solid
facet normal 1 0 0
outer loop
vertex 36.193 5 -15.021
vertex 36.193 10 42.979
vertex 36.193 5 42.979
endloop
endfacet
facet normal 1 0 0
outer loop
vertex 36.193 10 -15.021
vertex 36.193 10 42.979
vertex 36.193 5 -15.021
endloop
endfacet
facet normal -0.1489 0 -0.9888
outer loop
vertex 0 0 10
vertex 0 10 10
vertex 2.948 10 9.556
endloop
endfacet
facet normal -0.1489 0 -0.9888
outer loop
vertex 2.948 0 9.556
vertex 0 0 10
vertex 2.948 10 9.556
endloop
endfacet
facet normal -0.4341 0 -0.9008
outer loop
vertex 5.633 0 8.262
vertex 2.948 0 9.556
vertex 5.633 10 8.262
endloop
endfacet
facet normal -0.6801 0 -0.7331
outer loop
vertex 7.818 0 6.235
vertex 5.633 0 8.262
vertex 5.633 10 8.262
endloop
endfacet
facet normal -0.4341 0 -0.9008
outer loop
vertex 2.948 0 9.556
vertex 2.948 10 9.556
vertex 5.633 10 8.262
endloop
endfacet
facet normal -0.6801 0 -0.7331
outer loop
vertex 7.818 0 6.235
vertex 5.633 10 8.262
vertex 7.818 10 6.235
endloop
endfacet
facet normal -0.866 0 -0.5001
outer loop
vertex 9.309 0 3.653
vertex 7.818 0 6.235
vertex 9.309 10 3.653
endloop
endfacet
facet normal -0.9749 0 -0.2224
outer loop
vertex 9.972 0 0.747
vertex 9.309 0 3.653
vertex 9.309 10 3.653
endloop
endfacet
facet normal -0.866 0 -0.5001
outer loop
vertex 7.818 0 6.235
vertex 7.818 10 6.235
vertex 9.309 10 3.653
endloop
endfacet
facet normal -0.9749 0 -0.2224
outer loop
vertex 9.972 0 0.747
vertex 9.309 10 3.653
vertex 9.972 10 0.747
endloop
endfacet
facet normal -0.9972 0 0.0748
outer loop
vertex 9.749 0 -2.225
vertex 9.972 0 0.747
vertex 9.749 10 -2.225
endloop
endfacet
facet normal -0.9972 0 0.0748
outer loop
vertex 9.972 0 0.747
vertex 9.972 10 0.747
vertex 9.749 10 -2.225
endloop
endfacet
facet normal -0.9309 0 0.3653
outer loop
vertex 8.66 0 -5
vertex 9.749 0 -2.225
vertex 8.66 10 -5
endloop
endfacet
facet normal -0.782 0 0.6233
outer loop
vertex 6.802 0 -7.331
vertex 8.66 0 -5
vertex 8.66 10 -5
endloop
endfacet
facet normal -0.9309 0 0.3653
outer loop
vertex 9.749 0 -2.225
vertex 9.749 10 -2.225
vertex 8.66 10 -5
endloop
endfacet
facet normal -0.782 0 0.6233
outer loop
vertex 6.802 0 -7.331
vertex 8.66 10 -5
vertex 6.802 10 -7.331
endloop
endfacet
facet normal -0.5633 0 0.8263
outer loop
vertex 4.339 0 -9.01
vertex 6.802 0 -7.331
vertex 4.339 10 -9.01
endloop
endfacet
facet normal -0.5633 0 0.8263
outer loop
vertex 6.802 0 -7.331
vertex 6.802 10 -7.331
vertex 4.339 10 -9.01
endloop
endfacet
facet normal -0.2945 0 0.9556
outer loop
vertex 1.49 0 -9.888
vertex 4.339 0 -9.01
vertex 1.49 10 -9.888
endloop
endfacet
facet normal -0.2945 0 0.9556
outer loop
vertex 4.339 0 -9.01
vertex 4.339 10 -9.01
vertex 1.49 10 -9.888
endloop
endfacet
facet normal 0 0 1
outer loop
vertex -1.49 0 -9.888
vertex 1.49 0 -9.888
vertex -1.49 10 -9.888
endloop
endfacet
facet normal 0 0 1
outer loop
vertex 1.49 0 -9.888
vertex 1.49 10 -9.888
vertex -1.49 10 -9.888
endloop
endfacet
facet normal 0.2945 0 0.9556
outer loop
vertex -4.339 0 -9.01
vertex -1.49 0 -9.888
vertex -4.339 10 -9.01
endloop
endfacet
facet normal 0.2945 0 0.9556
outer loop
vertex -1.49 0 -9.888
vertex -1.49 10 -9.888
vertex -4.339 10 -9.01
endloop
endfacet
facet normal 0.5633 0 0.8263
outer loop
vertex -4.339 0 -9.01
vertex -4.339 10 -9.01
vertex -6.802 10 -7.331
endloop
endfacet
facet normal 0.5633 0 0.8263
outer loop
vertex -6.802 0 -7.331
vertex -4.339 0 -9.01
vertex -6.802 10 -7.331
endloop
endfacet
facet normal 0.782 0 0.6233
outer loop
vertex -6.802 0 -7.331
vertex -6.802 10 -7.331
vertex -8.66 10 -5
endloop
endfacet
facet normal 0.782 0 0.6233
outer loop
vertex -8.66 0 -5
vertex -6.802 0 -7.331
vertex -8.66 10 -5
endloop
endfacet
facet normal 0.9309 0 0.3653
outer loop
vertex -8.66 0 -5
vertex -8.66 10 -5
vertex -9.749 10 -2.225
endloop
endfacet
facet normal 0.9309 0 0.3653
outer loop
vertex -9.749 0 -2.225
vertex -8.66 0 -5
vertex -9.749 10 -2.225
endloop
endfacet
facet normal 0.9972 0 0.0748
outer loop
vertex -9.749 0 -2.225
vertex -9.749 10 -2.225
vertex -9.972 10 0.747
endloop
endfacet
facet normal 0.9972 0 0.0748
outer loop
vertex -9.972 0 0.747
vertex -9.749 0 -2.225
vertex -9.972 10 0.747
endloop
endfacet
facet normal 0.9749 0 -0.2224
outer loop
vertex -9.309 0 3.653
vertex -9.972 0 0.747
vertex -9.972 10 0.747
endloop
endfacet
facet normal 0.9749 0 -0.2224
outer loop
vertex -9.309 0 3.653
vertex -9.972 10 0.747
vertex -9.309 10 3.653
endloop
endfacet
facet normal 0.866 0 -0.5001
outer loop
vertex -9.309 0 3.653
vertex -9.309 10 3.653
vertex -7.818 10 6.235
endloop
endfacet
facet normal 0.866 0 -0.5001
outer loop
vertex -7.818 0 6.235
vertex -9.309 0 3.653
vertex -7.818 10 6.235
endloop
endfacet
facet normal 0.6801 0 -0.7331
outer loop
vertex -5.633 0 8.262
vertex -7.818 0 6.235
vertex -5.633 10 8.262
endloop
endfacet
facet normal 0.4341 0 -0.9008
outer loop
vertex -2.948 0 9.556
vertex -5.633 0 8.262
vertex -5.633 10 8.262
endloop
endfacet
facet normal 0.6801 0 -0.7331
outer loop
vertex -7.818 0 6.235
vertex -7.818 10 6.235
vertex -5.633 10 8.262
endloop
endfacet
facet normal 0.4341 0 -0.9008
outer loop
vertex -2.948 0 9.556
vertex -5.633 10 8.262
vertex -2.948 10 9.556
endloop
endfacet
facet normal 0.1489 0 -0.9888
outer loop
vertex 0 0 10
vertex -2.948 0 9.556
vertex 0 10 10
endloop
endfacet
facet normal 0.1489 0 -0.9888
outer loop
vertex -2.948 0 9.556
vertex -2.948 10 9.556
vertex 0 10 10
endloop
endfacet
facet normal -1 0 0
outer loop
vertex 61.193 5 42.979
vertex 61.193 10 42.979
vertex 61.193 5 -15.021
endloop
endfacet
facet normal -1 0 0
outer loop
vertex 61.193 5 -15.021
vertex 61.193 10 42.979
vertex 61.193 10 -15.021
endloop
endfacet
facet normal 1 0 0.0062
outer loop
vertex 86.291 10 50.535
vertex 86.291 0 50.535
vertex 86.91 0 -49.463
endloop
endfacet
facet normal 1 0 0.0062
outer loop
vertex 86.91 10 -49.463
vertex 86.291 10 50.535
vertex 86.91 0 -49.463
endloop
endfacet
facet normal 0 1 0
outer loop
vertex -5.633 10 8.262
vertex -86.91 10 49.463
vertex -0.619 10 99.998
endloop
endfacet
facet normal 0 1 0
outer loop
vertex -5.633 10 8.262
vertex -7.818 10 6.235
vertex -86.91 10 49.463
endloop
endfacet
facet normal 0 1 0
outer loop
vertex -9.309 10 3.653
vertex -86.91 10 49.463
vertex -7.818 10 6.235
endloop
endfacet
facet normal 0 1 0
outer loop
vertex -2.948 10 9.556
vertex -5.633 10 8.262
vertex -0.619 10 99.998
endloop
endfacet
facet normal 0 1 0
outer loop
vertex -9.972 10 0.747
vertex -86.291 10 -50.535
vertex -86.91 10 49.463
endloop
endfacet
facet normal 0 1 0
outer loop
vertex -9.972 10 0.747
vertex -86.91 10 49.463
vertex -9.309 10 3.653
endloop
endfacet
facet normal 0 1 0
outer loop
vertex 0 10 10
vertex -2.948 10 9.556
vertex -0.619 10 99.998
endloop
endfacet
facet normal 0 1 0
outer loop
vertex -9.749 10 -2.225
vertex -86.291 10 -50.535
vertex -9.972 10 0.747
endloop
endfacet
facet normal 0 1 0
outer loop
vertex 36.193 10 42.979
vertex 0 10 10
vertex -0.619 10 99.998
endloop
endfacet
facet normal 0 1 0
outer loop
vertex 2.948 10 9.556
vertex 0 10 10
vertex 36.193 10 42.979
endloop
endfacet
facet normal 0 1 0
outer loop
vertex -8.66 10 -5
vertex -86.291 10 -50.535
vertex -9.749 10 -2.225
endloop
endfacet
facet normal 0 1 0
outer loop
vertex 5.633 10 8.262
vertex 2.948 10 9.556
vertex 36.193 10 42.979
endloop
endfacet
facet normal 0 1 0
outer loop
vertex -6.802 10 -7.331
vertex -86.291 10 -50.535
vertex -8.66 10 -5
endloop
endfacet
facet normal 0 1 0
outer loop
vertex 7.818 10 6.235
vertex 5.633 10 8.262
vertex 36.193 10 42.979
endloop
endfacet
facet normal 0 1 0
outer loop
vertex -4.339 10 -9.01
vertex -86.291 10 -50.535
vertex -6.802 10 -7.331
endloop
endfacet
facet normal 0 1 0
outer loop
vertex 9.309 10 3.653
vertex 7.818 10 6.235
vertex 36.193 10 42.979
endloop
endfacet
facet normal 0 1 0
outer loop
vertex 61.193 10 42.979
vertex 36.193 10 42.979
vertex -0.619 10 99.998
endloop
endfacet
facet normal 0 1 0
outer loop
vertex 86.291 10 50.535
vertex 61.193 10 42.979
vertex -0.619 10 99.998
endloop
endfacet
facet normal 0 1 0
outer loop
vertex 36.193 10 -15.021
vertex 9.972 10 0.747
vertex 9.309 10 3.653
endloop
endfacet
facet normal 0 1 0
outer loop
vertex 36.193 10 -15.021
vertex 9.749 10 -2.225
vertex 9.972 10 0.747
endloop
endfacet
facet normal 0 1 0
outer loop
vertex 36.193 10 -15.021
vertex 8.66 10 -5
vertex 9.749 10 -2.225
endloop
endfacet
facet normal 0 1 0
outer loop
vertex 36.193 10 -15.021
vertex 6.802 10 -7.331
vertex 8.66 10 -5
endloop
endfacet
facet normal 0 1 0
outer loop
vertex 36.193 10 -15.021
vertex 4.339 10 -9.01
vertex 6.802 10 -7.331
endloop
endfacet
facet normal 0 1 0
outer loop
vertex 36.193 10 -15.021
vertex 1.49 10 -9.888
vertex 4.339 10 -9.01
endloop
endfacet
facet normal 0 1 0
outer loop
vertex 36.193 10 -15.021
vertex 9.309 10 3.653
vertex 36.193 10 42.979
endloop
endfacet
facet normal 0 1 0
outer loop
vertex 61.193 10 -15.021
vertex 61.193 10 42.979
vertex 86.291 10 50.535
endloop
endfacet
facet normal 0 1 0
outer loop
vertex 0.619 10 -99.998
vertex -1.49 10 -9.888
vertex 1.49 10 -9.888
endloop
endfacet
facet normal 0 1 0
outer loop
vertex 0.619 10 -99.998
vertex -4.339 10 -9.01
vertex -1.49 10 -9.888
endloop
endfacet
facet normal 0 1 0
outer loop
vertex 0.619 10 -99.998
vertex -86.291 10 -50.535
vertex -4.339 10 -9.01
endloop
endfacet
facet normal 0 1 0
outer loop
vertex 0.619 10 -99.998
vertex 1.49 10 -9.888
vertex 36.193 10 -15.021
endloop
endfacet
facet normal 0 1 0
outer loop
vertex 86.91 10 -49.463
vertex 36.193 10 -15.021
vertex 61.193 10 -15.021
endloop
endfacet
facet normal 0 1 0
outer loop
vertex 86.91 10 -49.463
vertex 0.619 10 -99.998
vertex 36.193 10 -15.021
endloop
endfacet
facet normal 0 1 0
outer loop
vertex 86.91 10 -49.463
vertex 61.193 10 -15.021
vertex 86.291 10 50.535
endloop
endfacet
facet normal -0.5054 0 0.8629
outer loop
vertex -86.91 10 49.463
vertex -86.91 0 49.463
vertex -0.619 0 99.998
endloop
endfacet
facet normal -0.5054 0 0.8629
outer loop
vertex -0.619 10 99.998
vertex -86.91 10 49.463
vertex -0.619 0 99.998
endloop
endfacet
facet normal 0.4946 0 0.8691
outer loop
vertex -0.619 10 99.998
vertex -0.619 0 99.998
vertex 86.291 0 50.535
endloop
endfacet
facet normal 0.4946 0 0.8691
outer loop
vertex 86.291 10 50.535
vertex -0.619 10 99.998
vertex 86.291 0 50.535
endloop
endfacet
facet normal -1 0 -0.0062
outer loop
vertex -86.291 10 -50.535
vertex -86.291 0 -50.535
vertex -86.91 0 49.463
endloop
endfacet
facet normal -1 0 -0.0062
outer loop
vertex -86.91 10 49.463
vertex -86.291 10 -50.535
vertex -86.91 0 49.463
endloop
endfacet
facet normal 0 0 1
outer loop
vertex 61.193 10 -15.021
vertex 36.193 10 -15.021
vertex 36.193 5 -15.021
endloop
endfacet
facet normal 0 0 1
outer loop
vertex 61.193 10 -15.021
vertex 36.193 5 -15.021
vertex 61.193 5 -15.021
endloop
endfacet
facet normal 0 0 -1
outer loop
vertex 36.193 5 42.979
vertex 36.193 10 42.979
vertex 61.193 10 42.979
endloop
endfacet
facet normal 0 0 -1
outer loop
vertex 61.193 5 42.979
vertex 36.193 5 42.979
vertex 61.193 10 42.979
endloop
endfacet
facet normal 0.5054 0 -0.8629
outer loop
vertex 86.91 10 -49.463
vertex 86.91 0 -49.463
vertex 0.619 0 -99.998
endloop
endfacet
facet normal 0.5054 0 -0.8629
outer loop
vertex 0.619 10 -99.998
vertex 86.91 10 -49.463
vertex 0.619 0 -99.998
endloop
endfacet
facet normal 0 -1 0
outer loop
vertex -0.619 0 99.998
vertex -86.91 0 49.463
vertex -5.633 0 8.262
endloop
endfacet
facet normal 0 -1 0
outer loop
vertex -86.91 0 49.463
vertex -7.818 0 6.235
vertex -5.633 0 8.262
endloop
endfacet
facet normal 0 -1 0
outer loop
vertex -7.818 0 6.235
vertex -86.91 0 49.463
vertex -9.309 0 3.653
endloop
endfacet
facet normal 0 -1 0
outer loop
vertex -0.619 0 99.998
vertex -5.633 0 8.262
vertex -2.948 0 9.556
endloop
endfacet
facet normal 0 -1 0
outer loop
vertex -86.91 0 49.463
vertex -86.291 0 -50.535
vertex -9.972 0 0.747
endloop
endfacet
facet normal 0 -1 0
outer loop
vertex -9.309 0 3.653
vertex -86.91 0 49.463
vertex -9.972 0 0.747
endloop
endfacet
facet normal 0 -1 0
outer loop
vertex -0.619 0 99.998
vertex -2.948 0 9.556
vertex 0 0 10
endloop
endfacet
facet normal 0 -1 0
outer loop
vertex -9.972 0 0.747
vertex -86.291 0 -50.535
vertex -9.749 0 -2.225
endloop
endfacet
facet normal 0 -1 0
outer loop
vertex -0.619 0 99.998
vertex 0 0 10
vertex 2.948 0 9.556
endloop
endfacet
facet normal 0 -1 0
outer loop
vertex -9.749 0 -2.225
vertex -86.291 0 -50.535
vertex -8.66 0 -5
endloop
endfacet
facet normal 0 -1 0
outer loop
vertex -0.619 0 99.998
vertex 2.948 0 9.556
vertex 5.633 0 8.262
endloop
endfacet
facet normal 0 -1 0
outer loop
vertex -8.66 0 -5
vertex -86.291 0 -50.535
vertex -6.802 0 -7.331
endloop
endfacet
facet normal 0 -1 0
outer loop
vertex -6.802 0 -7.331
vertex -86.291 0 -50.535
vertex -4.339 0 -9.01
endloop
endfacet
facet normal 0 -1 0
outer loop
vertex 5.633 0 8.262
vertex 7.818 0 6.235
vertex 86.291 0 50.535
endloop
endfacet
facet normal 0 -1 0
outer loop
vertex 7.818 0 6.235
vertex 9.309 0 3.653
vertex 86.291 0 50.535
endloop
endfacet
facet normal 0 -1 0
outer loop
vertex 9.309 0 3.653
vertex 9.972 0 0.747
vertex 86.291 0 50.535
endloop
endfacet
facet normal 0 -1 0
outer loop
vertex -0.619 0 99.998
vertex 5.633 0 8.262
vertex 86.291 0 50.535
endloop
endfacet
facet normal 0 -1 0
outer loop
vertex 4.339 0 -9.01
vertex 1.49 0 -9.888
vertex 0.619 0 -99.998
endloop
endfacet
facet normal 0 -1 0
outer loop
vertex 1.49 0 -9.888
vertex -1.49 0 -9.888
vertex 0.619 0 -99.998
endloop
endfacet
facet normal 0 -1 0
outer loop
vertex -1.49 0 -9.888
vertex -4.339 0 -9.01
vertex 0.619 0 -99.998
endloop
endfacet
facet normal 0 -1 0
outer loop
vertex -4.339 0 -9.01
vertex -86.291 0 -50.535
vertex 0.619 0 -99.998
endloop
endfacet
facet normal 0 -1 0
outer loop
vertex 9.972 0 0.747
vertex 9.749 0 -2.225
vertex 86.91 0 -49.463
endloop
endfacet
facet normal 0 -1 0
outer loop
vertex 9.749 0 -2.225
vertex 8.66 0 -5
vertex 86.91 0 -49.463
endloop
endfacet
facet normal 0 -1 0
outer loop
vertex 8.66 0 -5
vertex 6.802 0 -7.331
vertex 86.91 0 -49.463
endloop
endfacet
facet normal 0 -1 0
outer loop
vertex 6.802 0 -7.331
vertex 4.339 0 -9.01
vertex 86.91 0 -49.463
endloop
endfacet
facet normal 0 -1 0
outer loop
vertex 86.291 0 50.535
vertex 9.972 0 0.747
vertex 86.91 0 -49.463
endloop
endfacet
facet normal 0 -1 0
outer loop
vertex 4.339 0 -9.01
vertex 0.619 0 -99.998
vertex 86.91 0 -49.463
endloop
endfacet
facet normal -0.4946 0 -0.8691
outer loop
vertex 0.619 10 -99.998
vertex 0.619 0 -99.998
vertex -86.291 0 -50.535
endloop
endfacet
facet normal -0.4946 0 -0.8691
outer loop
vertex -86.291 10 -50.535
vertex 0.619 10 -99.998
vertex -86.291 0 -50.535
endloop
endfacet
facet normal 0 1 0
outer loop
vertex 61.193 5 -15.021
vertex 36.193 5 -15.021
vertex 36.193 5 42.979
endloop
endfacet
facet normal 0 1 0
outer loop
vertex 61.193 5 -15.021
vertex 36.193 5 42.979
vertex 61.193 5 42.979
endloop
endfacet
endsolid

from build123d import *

# Parameters (mm, degrees)
SALIENTE_EXTRUIR1_DEPTH = 10
CROQUIS2_R              = 10
CORTAR_EXTRUIR1_DEPTH   = 10
CROQUIS3_W              = 25
CROQUIS3_H              = 58
CORTAR_EXTRUIR2_DEPTH   = 5


with BuildPart() as part:
    # Croquis1 → Saliente-Extruir1 (new body)
    with BuildSketch(Plane(origin=(0, 0, 0), x_dir=(1, 0, 0), z_dir=(0, 1, 0))):
        Polygon((-86.291306126, 50.535240052), (-86.910454734, -49.462843205), (-0.619148608, -99.998083257), (86.291306126, -50.535240052), (86.910454734, 49.462843205), (0.619148608, 99.998083257), align=None)
    extrude(amount=SALIENTE_EXTRUIR1_DEPTH)

    # Croquis2 → Cortar-Extruir1 (cut)
    with BuildSketch(Plane(origin=(0, 10, 0), x_dir=(1, 0, 0), z_dir=(0, 1, 0))):
        with Locations(Location((0, 0, 0), (0, 0, 270))):
            Circle(CROQUIS2_R)
    extrude(amount=-CORTAR_EXTRUIR1_DEPTH, mode=Mode.SUBTRACT)

    # Croquis3 → Cortar-Extruir2 (cut)
    with BuildSketch(Plane(origin=(0, 10, 0), x_dir=(1, 0, 0), z_dir=(0, 1, 0))):
        with Locations((48.693290604, -13.979093197)):
            Rectangle(CROQUIS3_W, CROQUIS3_H)
    extrude(amount=-CORTAR_EXTRUIR2_DEPTH, mode=Mode.SUBTRACT)


solid = part.part
